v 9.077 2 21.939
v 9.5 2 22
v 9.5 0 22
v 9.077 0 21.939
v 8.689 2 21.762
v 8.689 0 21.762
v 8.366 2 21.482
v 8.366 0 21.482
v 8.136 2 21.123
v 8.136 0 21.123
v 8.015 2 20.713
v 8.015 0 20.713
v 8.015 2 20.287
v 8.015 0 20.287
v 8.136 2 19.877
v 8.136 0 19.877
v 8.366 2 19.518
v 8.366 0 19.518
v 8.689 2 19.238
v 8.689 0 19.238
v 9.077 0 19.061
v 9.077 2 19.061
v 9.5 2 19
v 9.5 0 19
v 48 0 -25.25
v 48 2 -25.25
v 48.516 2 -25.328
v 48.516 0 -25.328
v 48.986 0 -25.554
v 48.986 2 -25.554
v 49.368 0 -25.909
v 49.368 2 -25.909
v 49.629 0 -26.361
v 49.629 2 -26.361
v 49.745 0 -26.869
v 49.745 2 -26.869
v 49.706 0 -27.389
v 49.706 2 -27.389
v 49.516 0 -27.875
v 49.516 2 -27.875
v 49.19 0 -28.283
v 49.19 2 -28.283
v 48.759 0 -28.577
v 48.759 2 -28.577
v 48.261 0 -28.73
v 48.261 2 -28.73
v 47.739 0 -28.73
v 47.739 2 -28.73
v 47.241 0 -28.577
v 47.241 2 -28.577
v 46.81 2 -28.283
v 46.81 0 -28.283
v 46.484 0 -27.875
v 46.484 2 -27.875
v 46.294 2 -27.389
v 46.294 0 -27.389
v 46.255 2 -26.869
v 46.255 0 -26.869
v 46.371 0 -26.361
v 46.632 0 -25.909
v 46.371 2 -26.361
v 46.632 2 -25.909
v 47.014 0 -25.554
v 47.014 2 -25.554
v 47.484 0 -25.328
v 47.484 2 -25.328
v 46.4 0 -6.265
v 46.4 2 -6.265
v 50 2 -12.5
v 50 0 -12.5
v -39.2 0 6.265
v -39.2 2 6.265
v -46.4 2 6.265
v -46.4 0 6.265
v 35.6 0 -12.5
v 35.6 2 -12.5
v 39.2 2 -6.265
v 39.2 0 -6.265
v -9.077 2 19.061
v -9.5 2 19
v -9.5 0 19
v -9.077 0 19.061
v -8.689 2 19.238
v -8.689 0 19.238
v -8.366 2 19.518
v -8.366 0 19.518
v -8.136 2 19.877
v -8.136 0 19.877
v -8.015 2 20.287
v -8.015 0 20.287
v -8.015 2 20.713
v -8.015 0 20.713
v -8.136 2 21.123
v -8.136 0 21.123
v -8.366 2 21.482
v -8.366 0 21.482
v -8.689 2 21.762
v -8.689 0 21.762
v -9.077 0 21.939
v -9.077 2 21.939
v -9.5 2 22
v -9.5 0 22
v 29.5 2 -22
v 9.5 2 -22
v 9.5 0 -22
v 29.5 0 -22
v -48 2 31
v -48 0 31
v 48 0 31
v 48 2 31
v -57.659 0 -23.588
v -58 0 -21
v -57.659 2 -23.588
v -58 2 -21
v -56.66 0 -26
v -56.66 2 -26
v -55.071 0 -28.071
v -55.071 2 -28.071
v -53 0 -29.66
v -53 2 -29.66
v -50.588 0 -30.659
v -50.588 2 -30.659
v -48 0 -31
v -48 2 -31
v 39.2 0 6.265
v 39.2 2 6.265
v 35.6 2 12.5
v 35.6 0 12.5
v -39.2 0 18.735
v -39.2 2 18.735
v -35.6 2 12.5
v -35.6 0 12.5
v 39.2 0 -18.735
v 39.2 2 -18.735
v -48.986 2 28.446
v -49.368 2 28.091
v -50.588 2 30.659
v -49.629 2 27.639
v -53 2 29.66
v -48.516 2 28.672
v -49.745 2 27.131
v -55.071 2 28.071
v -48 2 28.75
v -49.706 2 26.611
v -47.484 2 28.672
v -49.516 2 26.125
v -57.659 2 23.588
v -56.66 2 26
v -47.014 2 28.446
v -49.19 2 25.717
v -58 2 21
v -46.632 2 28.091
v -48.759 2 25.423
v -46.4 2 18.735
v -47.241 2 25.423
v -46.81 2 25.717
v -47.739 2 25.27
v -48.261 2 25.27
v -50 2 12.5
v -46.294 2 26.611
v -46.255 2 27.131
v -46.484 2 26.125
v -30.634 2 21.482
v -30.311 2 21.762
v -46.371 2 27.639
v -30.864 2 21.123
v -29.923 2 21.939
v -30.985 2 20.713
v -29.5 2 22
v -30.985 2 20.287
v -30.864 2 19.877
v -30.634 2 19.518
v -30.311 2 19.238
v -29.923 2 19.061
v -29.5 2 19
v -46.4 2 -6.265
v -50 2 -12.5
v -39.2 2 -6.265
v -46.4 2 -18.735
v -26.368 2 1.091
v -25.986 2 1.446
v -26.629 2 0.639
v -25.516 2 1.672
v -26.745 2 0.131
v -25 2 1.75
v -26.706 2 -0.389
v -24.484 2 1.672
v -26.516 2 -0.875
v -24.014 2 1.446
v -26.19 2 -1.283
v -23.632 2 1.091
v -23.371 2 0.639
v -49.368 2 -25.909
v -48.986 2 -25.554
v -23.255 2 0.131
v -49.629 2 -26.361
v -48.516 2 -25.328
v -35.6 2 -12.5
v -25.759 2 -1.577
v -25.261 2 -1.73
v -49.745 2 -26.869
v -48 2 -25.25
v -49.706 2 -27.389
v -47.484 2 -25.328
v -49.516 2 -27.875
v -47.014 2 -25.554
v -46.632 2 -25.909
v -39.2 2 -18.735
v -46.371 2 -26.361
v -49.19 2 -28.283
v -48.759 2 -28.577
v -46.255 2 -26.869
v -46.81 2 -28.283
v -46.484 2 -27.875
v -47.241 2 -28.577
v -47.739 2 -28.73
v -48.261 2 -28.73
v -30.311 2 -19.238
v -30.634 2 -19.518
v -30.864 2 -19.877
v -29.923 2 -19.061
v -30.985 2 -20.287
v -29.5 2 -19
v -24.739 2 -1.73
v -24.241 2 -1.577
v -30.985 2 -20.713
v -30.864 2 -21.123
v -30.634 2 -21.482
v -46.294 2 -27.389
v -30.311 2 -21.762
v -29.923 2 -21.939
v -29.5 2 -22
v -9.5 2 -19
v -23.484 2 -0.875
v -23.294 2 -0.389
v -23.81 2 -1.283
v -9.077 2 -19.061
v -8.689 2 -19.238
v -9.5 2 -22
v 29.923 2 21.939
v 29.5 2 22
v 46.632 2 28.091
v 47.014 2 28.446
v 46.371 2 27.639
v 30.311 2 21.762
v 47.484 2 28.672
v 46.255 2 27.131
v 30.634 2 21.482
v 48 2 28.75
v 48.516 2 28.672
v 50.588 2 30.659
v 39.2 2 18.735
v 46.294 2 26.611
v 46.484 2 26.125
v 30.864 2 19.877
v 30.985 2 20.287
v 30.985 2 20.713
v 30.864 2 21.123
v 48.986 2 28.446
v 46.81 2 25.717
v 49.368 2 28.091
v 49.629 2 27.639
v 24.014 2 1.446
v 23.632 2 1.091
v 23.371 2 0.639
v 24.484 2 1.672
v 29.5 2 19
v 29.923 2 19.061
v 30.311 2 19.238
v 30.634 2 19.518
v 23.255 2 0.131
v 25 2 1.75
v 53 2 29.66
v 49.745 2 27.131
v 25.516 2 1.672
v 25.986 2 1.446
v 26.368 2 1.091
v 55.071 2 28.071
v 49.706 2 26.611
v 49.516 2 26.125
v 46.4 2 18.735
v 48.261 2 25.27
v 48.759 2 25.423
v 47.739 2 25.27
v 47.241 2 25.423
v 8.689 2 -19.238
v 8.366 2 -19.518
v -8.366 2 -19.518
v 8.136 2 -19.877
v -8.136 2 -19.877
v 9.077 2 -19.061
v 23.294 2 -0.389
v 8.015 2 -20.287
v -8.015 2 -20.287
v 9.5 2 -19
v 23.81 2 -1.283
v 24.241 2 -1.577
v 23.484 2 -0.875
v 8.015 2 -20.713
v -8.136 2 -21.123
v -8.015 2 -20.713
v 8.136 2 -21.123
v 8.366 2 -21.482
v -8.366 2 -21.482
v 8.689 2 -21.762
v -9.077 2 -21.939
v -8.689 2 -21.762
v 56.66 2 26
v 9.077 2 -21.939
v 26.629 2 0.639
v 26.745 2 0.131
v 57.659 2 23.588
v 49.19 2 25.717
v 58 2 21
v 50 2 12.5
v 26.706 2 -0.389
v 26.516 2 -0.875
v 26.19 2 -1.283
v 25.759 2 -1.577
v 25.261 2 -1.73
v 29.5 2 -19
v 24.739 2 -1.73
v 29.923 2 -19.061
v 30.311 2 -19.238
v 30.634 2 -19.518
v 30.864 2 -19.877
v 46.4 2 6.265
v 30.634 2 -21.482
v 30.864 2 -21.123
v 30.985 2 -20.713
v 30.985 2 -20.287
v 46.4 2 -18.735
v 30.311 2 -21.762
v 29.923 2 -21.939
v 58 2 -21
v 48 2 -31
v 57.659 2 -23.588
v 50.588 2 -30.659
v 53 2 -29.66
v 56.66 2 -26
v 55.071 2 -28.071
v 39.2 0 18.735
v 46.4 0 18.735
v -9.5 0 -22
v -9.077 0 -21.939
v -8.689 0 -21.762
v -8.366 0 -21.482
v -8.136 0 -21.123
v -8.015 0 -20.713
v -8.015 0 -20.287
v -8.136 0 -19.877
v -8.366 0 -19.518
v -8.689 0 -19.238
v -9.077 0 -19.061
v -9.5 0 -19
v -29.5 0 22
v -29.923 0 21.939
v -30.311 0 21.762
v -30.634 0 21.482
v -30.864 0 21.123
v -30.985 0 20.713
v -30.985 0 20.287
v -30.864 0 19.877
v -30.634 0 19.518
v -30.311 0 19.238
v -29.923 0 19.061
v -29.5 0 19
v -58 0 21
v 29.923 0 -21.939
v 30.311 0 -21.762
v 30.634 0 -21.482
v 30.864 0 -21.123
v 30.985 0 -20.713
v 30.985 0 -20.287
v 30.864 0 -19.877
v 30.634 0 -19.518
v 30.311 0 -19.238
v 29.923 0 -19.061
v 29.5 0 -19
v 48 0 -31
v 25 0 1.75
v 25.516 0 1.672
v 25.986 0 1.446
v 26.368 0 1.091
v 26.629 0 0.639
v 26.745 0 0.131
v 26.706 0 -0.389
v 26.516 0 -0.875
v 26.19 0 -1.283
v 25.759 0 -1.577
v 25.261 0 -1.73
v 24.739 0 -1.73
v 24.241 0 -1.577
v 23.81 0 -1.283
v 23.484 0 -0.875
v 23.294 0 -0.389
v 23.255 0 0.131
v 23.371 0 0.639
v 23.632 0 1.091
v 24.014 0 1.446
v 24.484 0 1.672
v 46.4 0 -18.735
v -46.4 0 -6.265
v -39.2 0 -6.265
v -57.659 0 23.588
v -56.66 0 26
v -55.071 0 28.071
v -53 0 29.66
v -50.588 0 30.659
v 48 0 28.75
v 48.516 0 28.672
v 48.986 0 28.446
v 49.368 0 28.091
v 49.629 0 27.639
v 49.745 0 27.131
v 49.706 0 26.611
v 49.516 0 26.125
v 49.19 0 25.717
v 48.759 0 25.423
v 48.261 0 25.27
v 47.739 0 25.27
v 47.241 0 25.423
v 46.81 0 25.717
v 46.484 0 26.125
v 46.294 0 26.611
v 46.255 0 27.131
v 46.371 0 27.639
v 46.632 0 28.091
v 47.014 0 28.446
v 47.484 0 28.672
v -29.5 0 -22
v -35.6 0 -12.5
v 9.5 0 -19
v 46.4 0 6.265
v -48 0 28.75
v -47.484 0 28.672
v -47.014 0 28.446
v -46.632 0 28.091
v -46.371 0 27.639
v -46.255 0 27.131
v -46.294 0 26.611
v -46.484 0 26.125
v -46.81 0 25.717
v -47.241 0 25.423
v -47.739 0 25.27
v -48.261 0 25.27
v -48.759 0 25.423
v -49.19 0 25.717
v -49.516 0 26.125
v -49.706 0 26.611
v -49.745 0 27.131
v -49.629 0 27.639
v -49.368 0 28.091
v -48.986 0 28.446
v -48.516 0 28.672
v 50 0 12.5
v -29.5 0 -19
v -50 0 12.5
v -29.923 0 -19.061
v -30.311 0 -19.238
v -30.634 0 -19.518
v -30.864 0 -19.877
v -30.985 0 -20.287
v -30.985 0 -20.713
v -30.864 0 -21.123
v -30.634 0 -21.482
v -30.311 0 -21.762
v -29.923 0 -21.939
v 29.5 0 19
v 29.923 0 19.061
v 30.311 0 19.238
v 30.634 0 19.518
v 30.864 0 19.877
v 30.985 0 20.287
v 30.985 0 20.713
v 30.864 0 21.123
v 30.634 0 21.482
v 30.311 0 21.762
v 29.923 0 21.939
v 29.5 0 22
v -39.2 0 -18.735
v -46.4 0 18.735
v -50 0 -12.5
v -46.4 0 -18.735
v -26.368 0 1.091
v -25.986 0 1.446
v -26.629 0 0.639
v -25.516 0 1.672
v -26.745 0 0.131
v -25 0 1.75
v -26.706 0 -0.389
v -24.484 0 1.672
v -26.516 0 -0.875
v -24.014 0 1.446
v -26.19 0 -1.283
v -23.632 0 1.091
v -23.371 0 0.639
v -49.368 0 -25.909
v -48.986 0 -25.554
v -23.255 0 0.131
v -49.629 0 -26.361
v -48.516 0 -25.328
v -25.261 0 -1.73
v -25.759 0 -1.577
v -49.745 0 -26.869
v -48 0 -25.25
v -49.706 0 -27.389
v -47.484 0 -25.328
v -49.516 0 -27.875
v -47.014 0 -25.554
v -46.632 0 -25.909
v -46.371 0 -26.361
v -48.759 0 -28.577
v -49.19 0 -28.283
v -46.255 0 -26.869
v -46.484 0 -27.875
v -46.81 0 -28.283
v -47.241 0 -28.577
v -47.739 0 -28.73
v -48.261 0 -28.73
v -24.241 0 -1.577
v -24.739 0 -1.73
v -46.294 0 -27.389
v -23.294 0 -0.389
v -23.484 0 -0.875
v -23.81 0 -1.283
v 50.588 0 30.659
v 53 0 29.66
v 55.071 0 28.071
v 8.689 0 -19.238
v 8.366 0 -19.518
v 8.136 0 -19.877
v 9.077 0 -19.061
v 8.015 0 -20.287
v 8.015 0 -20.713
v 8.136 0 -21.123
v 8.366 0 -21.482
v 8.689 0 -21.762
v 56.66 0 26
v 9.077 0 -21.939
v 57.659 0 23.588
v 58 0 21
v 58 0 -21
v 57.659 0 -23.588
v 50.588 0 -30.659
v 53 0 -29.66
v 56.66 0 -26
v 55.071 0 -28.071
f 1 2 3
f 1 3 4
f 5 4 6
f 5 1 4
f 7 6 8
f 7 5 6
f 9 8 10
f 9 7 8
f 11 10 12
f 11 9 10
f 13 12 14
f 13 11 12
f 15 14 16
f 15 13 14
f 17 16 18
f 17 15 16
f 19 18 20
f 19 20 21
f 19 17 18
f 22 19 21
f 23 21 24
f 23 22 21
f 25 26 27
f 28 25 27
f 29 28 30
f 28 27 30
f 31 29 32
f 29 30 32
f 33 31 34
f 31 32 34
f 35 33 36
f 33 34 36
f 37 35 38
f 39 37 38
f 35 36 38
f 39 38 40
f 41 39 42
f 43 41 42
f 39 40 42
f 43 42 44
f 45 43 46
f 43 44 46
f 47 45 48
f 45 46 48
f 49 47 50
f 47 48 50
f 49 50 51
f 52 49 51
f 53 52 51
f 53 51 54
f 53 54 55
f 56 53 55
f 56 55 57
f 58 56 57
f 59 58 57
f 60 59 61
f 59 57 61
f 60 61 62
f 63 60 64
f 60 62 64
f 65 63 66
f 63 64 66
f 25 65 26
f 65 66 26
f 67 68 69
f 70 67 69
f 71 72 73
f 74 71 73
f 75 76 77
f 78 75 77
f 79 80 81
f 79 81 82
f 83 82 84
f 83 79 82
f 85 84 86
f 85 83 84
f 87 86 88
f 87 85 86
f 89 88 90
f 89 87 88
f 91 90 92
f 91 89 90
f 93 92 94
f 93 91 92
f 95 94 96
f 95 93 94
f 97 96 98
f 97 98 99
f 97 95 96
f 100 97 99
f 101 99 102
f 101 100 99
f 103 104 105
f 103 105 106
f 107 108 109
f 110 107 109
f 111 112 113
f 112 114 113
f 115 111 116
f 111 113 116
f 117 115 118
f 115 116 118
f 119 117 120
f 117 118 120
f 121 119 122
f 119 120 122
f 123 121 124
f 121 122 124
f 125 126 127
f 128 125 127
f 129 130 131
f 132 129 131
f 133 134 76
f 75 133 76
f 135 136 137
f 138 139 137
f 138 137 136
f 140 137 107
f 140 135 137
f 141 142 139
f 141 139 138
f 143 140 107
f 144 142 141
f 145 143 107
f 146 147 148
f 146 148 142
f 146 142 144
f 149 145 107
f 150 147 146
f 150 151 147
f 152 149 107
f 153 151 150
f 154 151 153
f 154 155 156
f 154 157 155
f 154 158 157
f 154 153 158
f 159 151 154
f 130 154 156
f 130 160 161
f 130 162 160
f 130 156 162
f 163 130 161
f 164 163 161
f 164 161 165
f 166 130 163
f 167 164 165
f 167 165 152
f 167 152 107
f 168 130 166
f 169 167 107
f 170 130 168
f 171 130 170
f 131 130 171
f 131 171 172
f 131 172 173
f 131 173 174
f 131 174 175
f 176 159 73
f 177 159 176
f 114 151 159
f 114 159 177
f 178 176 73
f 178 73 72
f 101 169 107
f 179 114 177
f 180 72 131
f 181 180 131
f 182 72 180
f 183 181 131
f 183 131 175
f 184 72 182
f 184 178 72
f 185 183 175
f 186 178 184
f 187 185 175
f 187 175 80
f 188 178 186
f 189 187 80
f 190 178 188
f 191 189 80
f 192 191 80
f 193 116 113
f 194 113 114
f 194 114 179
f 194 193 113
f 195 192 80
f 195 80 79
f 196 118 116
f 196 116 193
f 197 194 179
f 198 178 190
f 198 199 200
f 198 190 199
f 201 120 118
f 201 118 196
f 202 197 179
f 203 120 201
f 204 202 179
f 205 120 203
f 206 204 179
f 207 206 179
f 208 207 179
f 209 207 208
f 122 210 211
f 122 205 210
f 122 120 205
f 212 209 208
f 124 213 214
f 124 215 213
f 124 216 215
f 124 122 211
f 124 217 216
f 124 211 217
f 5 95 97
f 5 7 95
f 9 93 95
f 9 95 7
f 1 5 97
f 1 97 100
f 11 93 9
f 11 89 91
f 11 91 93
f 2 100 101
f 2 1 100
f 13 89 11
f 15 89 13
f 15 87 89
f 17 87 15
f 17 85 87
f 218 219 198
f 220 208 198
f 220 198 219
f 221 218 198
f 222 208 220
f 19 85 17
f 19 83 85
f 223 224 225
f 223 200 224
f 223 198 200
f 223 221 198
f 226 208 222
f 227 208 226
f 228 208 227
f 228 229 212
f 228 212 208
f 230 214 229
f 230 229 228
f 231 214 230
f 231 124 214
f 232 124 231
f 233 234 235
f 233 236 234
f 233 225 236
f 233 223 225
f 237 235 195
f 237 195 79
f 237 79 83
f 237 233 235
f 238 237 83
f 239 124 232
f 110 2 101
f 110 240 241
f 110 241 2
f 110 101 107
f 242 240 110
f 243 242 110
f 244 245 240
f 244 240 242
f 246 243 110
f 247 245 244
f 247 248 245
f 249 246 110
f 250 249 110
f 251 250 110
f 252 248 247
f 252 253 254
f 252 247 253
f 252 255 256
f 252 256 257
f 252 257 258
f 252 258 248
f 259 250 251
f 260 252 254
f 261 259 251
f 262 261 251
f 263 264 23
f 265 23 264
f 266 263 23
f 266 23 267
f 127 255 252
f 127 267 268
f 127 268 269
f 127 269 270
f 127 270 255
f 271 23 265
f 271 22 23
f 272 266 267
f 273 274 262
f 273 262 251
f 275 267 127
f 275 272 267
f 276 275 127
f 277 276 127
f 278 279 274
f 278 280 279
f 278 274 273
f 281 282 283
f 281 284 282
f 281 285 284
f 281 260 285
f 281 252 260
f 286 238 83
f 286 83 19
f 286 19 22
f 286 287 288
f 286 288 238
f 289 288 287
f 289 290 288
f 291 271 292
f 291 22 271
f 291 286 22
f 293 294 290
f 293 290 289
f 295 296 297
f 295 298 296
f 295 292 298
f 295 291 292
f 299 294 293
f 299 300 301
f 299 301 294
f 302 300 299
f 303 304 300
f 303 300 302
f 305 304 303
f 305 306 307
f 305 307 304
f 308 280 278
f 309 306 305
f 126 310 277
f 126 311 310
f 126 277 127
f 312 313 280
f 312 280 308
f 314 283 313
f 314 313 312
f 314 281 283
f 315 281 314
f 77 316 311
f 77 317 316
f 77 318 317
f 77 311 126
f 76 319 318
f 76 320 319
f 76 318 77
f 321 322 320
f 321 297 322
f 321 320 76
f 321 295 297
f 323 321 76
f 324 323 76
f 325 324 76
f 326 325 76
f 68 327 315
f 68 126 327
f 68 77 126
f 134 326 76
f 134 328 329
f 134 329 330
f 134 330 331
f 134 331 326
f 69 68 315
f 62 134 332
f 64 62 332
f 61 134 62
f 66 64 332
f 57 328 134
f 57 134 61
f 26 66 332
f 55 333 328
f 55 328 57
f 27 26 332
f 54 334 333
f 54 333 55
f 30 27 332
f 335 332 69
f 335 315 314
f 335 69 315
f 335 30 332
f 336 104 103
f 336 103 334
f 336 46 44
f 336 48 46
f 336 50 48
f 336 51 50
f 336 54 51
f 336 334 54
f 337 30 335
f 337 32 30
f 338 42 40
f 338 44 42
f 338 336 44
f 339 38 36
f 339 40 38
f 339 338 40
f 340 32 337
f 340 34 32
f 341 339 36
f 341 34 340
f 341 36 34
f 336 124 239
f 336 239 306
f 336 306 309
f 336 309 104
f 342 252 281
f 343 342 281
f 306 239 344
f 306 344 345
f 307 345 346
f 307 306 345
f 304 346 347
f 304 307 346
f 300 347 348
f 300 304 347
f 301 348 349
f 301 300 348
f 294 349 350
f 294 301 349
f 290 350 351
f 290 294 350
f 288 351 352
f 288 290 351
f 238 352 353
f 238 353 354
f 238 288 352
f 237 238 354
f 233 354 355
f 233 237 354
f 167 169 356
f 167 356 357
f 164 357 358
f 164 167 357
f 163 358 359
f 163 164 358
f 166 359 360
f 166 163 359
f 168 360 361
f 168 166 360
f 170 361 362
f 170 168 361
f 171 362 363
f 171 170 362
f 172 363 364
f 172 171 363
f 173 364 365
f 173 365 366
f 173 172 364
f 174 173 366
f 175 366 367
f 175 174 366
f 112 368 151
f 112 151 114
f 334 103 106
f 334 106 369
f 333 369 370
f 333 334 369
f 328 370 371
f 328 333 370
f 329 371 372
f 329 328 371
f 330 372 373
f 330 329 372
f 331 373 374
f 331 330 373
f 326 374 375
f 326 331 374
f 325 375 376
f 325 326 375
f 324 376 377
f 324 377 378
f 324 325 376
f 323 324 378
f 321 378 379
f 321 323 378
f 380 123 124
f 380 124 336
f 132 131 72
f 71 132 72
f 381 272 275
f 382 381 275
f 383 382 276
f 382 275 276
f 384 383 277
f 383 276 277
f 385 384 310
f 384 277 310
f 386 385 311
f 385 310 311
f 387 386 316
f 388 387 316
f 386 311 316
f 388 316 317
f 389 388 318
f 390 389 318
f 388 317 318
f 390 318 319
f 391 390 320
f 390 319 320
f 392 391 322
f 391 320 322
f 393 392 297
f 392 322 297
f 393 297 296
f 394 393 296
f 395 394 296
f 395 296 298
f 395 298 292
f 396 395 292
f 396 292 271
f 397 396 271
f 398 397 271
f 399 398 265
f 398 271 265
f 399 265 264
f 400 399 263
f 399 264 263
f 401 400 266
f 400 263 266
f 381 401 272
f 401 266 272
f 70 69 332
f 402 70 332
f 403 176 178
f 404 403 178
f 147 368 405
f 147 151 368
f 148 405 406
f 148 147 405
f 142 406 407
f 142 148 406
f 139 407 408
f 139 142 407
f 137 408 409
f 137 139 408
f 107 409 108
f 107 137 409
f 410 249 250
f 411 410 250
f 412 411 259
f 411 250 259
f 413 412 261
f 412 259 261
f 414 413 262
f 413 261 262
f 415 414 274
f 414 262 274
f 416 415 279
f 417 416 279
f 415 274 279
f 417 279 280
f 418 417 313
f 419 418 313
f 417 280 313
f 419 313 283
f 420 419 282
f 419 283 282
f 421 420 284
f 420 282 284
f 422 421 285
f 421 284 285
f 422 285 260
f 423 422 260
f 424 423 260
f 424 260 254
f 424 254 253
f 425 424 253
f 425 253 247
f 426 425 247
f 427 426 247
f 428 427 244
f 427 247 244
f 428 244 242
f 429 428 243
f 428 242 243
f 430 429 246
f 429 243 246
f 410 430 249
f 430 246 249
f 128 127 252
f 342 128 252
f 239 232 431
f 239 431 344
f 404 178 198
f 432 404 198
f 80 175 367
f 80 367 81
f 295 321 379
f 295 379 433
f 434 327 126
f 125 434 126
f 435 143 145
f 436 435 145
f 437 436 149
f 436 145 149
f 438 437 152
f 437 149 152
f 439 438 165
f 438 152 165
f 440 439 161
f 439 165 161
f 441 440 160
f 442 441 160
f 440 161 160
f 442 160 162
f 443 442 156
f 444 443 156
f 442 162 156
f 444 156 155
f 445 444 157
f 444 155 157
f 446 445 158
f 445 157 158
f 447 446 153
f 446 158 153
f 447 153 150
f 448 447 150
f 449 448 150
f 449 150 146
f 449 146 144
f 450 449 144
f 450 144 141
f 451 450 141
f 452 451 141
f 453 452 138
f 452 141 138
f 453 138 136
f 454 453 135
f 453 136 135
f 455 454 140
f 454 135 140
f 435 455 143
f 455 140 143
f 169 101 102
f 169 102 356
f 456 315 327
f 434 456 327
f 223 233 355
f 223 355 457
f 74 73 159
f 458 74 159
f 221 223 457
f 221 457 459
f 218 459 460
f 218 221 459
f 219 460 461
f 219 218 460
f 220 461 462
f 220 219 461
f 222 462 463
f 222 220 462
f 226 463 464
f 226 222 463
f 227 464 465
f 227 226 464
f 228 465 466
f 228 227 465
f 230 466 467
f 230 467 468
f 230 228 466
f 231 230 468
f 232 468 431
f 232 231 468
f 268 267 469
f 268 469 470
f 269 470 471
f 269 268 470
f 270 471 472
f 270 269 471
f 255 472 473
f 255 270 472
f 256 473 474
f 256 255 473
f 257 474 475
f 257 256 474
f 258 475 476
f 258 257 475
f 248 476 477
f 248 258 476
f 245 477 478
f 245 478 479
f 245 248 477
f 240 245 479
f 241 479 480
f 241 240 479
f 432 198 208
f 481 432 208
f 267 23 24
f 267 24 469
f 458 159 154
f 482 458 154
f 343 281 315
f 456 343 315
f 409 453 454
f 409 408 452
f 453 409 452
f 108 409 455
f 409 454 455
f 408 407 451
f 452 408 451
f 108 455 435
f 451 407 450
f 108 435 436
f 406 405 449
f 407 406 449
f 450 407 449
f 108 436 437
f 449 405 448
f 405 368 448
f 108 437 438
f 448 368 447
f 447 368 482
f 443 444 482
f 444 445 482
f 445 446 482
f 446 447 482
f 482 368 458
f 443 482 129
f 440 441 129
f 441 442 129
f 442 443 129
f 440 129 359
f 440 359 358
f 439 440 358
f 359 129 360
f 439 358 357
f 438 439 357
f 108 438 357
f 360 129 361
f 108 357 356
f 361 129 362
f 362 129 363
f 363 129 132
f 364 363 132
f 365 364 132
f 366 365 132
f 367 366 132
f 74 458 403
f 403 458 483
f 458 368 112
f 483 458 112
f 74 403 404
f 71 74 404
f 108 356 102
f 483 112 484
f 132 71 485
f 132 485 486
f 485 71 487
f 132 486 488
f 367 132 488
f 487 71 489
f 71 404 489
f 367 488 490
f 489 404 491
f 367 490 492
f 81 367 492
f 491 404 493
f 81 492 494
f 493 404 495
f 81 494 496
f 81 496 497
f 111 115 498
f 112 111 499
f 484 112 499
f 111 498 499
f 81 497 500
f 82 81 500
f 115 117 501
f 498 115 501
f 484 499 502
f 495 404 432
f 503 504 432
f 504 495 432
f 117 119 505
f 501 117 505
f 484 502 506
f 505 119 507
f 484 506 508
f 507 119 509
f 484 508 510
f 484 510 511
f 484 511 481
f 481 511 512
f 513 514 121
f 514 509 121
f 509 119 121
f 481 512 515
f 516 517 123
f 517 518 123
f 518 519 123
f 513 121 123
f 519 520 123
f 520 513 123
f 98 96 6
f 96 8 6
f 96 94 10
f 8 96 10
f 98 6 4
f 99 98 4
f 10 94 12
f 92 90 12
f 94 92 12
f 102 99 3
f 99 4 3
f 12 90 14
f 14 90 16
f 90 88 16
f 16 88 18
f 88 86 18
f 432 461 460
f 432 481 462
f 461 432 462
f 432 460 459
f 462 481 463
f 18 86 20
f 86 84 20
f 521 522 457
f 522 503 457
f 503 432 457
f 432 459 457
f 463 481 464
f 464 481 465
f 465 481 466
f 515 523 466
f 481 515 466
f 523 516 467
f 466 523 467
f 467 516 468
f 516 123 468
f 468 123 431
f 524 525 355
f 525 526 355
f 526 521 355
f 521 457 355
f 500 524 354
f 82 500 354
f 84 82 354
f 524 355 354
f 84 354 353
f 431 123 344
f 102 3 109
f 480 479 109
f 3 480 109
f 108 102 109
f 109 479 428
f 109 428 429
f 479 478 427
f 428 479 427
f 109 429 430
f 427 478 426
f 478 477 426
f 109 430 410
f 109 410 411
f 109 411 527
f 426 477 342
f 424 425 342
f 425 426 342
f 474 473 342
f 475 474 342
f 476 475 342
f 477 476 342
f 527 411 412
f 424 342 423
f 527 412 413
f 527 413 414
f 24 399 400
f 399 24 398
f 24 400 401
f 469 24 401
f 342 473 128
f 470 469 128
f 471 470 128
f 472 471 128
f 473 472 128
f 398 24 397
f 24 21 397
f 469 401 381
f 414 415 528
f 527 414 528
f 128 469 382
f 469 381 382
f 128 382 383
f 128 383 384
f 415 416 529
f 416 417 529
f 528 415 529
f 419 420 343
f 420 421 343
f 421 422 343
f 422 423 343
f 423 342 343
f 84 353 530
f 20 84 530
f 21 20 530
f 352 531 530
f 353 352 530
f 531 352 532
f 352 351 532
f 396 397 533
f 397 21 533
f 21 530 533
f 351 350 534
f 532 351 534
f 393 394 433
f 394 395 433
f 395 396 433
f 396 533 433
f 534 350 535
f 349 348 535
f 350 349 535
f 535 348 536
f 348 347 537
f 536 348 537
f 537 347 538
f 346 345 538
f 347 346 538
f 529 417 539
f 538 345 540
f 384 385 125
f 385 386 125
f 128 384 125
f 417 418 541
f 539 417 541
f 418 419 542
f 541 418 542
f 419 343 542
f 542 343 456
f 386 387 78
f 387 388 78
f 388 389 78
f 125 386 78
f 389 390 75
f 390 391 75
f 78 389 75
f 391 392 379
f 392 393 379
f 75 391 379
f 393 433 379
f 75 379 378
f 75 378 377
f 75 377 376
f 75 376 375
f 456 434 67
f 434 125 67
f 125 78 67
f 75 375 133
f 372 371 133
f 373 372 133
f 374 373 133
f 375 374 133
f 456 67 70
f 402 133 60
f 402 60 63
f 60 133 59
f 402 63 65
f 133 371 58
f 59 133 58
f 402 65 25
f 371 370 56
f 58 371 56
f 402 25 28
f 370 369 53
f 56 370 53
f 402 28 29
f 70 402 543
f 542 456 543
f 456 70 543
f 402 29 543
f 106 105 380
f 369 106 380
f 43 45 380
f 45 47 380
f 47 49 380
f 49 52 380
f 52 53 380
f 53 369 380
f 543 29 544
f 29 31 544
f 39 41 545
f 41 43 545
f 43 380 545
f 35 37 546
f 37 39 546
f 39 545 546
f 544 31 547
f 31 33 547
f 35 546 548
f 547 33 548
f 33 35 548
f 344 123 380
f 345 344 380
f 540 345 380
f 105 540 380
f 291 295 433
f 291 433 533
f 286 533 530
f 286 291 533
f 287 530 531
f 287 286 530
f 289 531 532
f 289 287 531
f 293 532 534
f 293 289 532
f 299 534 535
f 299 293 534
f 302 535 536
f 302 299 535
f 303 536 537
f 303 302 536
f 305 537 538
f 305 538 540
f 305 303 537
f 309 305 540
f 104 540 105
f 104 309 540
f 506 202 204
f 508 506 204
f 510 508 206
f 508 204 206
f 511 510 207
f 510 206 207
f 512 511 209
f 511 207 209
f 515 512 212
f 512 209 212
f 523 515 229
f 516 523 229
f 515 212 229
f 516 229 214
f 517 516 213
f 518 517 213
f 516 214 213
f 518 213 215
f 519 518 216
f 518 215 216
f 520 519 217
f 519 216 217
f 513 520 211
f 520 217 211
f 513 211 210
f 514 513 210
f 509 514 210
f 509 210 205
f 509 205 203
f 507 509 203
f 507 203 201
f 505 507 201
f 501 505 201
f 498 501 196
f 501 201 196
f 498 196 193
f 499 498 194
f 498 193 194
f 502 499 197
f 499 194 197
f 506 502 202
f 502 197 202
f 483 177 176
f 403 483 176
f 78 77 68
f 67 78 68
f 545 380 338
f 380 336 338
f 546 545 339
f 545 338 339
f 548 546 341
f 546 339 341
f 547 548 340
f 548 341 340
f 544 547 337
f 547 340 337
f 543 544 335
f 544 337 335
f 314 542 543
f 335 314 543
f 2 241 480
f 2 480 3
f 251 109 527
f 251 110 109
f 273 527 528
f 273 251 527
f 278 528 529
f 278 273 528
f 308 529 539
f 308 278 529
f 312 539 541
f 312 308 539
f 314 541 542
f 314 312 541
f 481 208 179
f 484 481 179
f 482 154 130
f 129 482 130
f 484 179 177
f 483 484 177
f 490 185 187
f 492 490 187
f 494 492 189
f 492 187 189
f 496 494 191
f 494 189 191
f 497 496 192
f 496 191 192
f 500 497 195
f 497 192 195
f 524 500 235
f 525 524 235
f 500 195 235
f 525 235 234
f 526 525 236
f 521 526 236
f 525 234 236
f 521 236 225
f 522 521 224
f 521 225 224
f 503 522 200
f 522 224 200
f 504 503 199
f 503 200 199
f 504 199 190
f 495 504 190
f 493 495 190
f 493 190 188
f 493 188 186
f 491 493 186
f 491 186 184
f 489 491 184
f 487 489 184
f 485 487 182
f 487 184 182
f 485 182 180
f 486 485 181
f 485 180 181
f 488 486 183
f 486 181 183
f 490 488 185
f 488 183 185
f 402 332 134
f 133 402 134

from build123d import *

# Parameters (mm, degrees)
SKETCH1_W           = 116
SKETCH1_H           = 62
BOSS_EXTRUDE1_DEPTH = 2
SKETCH2_R           = 1.75
CUT_EXTRUDE1_DEPTH  = 2
SKETCH3_R           = 1.75
CUT_EXTRUDE2_DEPTH  = 2
FILLET2_R           = 10


with BuildPart() as part:
    # Sketch1 → Boss-Extrude1 (new body)
    with BuildSketch(Plane(origin=(0, 0, 0), x_dir=(1, 0, 0), z_dir=(0, 1, 0))):
        Rectangle(SKETCH1_W, SKETCH1_H)
    extrude(amount=BOSS_EXTRUDE1_DEPTH)

    # Sketch2 → Cut-Extrude1 (cut)
    with BuildSketch(Plane(origin=(0, 2, 0), x_dir=(1, 0, 0), z_dir=(0, 1, 0))):
        with Locations(Location((-48, 27, 0), (0, 0, 270))):
            Circle(SKETCH2_R)
        with Locations(Location((48, 27, 0), (0, 0, 270))):
            Circle(SKETCH2_R)
        with Locations(Location((48, -27, 0), (0, 0, 270))):
            Circle(SKETCH2_R)
        with Locations(Location((-48, -27, 0), (0, 0, 270))):
            Circle(SKETCH2_R)
    extrude(amount=-CUT_EXTRUDE1_DEPTH, mode=Mode.SUBTRACT)

    # Sketch3 → Cut-Extrude2 (cut)
    with BuildSketch(Plane(origin=(0, 2, 0), x_dir=(1, 0, 0), z_dir=(0, 1, 0))):
        with Locations(Location((25, 0, 0), (0, 0, 270))):
            Circle(SKETCH3_R)
        with Locations(Location((-25, 0, 0), (0, 0, 270))):
            Circle(SKETCH3_R)
        with BuildLine():
            Line((9.5, -19), (29.5, -19))
            ThreePointArc((29.5, -19), (31, -20.5), (29.5, -22))
            Line((29.5, -22), (9.5, -22))
            ThreePointArc((9.5, -22), (8, -20.5), (9.5, -19))
        make_face()
        with BuildLine():
            Line((-9.5, -22), (-29.5, -22))
            ThreePointArc((-29.5, -22), (-31, -20.5), (-29.5, -19))
            Line((-29.5, -19), (-9.5, -19))
            ThreePointArc((-9.5, -19), (-8, -20.5), (-9.5, -22))
        make_face()
        with BuildLine():
            Line((-29.5, 22), (-9.5, 22))
            ThreePointArc((-9.5, 22), (-8, 20.5), (-9.5, 19))
            Line((-9.5, 19), (-29.5, 19))
            ThreePointArc((-29.5, 19), (-31, 20.5), (-29.5, 22))
        make_face()
        with BuildLine():
            Line((9.5, 22), (29.5, 22))
            ThreePointArc((29.5, 22), (31, 20.5), (29.5, 19))
            Line((29.5, 19), (9.5, 19))
            ThreePointArc((9.5, 19), (8, 20.5), (9.5, 22))
        make_face()
        Polygon((-35.6, 12.5), (-39.2, 18.735382907), (-46.4, 18.735382907), (-50, 12.5), (-46.4, 6.264617093), (-39.2, 6.264617093), align=None)
        Polygon((-35.6, -12.5), (-39.2, -6.264617093), (-46.4, -6.264617093), (-50, -12.5), (-46.4, -18.735382907), (-39.2, -18.735382907), align=None)
        Polygon((50, 12.5), (46.4, 18.735382907), (39.2, 18.735382907), (35.6, 12.5), (39.2, 6.264617093), (46.4, 6.264617093), align=None)
        Polygon((50, -12.5), (46.4, -6.264617093), (39.2, -6.264617093), (35.6, -12.5), (39.2, -18.735382907), (46.4, -18.735382907), align=None)
    extrude(amount=-CUT_EXTRUDE2_DEPTH, mode=Mode.SUBTRACT)

    # Fillet2
    fillet2_edges = [part.edges().sort_by_distance(p)[0] for p in [
        (58, 1, 31),
        (-58, 1, 31),
        (-58, 1, -31),
        (58, 1, -31),
    ]]
    fillet(fillet2_edges, radius=FILLET2_R)


solid = part.part
